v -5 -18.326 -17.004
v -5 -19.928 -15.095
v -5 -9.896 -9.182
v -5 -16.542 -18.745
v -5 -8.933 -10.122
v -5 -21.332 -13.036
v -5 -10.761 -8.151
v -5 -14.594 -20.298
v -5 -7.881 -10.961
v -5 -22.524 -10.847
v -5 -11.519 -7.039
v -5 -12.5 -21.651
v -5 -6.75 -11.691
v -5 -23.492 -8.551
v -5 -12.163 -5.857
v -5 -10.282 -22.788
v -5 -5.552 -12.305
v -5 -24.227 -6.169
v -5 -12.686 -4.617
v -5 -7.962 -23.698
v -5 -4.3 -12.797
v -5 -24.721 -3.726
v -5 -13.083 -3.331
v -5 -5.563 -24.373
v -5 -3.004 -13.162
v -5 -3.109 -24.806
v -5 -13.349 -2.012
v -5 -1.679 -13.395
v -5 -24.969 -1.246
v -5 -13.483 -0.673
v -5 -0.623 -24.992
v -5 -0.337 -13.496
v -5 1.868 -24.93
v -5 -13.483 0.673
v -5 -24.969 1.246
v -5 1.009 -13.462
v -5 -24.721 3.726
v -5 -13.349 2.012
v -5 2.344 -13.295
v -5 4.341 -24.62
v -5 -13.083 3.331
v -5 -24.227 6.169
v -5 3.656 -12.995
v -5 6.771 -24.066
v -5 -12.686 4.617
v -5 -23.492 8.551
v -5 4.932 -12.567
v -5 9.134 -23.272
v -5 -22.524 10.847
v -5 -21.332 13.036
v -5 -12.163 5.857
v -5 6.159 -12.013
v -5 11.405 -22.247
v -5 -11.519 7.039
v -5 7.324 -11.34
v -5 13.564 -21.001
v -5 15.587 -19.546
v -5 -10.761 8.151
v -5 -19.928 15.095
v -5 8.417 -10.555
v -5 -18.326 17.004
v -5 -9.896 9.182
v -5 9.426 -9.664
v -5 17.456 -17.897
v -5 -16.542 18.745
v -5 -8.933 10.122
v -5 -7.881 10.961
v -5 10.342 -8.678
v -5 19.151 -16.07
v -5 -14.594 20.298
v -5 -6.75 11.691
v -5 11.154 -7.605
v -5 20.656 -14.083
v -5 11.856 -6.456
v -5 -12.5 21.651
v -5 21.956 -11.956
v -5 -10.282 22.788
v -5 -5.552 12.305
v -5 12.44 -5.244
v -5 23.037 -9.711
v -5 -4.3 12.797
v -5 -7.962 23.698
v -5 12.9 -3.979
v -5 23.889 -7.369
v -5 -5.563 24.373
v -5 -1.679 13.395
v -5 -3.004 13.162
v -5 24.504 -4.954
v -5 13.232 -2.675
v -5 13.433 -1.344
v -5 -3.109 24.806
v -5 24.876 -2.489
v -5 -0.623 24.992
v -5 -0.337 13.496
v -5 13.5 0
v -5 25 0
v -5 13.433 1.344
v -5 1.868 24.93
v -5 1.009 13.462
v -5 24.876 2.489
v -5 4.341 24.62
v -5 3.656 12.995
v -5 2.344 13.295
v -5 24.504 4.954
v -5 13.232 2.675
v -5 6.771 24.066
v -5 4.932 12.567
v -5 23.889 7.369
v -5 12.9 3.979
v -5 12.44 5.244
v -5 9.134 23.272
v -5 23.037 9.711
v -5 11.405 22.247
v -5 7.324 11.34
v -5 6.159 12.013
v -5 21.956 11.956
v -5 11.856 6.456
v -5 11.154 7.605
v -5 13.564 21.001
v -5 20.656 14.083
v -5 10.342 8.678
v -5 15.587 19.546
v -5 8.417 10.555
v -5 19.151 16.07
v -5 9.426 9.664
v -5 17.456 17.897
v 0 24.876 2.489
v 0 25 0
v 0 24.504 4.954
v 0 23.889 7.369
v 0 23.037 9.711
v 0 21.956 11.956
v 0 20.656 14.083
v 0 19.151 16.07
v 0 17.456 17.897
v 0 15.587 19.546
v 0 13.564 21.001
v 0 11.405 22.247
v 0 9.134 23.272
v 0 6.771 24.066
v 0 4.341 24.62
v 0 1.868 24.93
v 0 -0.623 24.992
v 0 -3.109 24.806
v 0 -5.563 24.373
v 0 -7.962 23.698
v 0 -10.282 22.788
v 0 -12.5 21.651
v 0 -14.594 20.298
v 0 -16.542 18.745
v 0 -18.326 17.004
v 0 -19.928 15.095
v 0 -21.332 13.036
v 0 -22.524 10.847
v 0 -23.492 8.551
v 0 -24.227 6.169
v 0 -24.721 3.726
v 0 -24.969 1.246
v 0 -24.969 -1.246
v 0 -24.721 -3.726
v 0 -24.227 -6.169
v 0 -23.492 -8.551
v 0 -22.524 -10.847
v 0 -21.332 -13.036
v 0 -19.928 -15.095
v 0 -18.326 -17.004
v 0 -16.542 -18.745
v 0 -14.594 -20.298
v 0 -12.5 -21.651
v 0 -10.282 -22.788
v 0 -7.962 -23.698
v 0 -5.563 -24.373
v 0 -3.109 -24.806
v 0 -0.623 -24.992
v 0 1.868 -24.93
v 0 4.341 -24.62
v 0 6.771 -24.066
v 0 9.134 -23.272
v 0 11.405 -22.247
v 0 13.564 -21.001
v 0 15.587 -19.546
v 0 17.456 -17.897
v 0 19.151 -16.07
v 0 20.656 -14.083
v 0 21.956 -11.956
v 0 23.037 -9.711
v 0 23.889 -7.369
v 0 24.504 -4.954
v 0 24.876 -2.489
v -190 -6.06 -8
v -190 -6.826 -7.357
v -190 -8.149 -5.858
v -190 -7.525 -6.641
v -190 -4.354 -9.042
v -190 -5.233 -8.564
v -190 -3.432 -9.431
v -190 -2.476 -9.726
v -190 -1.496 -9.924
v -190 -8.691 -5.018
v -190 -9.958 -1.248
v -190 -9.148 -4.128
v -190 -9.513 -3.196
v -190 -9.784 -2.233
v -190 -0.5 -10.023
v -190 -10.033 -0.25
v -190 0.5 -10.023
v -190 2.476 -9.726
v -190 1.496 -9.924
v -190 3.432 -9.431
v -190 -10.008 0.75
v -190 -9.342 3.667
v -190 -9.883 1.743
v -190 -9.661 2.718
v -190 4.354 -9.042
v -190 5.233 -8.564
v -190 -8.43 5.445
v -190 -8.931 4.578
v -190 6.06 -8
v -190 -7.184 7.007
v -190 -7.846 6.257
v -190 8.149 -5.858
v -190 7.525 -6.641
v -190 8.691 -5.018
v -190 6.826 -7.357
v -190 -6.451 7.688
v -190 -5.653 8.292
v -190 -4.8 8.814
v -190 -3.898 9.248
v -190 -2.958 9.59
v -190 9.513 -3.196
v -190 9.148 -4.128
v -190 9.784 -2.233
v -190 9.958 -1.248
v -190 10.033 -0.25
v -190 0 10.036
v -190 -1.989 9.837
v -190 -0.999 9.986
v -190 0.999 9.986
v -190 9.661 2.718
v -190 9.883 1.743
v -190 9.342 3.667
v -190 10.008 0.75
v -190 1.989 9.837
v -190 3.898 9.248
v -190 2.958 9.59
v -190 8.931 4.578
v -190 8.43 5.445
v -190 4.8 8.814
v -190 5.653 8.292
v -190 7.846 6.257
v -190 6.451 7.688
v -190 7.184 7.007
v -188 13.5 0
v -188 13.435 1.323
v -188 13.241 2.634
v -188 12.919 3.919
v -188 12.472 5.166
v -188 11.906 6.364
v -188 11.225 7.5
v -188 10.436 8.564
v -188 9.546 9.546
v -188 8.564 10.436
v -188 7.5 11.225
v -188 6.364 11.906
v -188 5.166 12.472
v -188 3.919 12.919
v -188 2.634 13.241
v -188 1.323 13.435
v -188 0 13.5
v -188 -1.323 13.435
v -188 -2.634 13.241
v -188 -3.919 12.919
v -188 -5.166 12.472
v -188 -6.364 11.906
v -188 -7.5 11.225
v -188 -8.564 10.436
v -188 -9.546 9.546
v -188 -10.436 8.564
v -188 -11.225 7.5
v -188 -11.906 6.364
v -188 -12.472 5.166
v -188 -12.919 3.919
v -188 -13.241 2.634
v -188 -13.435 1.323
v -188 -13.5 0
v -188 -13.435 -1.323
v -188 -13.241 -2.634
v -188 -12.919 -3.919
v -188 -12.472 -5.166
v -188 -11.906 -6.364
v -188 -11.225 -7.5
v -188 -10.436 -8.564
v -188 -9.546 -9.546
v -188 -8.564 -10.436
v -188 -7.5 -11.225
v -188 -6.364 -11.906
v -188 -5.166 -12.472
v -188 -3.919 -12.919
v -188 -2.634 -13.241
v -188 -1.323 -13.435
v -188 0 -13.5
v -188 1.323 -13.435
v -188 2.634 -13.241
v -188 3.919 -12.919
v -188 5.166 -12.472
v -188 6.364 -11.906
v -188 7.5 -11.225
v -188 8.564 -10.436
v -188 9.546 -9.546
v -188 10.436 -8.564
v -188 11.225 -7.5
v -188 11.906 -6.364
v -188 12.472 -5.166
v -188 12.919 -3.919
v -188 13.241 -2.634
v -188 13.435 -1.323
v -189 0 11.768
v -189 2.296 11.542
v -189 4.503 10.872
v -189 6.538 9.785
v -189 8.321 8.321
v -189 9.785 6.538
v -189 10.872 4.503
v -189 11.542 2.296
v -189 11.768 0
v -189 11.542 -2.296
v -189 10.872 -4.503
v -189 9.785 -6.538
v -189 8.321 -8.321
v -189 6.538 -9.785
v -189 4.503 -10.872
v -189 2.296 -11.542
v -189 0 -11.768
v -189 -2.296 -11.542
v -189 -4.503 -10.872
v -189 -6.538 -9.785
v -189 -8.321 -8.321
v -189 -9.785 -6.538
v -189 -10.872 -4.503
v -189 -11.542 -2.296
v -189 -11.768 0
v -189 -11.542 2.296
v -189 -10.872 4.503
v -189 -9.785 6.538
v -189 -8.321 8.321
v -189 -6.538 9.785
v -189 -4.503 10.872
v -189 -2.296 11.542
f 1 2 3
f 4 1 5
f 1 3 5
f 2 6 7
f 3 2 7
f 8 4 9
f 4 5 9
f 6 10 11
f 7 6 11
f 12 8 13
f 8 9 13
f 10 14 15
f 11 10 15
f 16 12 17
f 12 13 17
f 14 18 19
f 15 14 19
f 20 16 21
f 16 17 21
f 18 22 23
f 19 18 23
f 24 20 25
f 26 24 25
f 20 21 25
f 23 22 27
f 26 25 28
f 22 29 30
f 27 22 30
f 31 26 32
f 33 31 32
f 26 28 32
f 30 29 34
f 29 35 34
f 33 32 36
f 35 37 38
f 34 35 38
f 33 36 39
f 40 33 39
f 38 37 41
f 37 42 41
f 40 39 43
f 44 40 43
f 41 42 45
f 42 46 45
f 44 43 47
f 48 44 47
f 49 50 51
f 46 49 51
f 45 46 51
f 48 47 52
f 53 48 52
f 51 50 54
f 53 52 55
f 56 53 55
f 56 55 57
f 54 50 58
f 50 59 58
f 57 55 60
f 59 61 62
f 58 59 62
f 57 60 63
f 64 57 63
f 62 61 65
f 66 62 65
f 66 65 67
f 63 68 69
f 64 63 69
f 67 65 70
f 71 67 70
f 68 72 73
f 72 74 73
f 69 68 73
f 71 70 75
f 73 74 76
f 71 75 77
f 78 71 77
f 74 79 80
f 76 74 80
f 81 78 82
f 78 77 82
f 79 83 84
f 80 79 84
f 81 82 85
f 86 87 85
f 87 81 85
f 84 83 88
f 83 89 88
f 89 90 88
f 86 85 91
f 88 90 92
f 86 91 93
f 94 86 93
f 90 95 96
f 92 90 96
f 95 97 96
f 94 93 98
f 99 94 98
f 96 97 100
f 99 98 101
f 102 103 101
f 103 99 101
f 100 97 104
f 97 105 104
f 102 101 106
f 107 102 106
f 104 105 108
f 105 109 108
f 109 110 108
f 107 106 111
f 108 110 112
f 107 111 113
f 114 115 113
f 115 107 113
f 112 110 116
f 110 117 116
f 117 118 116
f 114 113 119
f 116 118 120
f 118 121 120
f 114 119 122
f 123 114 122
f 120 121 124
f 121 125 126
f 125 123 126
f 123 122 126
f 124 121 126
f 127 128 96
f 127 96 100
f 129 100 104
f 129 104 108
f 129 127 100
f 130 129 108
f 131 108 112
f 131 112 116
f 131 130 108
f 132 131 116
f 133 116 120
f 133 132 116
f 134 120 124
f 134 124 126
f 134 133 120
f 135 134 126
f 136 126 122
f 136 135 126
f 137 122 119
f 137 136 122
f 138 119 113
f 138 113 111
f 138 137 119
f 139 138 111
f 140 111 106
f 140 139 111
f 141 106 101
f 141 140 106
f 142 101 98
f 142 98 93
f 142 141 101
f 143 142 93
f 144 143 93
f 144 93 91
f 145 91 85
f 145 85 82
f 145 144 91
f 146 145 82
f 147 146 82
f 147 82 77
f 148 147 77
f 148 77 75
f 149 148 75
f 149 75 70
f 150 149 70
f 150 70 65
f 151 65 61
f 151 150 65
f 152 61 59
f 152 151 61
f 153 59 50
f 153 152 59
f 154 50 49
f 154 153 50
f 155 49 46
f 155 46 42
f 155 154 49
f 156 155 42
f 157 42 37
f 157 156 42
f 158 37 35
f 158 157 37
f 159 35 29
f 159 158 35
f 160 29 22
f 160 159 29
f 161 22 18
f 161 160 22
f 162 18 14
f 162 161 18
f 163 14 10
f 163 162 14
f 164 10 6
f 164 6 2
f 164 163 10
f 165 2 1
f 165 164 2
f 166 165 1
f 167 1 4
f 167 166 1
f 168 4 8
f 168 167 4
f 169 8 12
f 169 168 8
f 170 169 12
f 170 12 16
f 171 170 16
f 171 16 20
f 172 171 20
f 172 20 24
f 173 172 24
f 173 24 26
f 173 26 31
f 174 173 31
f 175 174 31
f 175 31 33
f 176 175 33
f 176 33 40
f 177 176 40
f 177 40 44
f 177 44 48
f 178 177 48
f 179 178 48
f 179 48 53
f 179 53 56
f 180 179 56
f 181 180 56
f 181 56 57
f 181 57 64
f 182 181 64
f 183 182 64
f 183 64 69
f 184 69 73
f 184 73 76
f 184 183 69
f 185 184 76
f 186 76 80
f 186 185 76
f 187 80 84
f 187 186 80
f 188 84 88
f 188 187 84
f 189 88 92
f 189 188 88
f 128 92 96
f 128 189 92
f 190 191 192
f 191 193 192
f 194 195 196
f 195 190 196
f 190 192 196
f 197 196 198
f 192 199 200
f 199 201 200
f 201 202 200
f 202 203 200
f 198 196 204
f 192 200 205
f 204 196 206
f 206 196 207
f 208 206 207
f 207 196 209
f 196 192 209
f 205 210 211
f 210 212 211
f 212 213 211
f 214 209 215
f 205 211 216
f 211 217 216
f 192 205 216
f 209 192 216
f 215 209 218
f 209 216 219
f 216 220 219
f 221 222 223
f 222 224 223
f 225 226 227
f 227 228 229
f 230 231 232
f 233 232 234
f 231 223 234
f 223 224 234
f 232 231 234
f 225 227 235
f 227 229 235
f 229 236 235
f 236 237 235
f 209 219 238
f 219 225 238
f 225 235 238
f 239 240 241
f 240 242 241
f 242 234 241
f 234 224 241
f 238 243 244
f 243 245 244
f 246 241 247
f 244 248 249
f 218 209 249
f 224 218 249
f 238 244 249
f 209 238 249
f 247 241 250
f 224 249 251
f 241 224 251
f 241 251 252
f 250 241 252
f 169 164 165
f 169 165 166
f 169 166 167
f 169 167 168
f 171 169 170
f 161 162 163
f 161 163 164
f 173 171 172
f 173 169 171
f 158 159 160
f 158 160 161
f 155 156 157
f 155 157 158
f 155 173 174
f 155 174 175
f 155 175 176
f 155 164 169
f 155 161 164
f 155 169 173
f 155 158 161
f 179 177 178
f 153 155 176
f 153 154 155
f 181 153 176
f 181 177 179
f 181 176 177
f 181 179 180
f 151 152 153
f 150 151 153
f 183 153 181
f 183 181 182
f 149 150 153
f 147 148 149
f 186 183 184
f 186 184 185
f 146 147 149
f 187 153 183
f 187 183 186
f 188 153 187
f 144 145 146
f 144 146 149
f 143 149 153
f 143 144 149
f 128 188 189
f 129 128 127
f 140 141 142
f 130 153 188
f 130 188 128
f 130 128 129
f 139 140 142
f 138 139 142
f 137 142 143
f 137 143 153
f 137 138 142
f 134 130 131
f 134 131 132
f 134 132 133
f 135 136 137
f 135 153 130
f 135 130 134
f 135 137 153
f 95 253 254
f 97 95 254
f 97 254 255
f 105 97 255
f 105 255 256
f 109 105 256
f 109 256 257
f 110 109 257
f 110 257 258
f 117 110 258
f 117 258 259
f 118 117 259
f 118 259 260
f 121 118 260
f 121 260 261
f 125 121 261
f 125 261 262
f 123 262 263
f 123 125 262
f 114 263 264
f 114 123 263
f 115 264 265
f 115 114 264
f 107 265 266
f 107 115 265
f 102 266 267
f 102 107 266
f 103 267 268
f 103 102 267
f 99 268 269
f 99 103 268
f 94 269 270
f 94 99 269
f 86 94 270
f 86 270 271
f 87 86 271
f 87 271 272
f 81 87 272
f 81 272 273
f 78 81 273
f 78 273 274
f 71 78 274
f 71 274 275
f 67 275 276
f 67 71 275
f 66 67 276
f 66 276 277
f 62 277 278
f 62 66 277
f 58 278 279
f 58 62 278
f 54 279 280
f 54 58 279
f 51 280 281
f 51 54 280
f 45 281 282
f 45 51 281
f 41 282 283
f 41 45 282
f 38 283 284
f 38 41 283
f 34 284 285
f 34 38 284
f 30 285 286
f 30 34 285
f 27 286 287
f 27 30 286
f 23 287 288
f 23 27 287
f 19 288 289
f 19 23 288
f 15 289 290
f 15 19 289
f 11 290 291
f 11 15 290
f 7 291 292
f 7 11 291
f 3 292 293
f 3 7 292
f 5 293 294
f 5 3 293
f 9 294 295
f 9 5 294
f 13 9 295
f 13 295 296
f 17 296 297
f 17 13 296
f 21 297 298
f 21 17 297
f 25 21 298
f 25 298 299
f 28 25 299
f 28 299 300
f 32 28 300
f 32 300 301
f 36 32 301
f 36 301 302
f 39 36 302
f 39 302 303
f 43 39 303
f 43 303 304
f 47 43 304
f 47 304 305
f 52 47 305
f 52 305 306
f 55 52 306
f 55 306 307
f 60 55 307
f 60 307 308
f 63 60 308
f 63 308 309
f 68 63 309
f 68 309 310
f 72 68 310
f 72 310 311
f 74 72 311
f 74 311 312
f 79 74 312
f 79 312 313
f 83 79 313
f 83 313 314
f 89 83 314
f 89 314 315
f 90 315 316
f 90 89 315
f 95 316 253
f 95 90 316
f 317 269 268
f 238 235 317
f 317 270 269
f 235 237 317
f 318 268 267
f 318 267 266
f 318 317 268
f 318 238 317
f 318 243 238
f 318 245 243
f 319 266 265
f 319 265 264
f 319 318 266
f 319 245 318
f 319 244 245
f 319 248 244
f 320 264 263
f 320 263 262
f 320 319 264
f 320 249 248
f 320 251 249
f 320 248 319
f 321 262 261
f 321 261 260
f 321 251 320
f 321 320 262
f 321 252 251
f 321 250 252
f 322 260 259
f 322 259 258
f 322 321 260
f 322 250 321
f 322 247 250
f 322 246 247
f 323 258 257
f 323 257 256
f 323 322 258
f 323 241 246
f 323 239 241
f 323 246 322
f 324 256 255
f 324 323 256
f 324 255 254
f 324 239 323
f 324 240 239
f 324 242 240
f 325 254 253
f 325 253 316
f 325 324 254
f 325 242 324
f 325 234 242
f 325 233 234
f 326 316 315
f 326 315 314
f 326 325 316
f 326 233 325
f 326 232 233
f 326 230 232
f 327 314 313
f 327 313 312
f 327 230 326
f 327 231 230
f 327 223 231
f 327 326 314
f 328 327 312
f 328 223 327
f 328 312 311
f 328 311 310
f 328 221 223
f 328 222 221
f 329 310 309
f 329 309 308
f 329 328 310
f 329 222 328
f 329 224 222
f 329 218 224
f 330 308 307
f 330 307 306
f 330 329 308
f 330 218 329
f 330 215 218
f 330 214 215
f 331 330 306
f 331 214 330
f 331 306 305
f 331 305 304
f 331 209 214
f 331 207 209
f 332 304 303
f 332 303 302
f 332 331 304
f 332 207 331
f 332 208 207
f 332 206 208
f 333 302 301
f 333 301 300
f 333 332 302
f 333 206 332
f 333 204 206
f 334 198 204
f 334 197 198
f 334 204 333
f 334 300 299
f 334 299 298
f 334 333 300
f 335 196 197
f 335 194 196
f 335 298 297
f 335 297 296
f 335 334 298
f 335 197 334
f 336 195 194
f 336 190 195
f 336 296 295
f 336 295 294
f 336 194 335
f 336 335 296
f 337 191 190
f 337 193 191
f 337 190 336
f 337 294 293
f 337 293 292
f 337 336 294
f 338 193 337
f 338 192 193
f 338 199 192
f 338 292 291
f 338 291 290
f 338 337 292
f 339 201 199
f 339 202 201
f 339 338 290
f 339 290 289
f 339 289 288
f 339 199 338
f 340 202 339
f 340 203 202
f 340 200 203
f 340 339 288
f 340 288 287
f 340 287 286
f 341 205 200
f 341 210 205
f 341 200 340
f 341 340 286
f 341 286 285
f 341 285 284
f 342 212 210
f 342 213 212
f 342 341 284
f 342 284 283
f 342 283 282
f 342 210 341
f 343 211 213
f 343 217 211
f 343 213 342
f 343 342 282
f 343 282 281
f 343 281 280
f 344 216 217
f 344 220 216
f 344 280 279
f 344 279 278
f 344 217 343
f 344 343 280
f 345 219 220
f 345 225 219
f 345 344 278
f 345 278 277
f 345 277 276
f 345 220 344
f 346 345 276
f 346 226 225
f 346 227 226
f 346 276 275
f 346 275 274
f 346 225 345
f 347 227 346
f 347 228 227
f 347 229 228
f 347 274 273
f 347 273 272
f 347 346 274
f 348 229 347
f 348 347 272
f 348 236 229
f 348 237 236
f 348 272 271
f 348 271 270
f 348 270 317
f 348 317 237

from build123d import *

# Parameters (mm, degrees)
F0_R     = 13.5
F1_DEPTH = 190
F0_R_2   = 25
F2_DEPTH = 5


with BuildPart() as f1:
    # F0 (on Right) → F1 (new body)
    with BuildSketch(Plane.YZ):
        Circle(F0_R)
    extrude(amount=-F1_DEPTH)

    # F0 (on Right) → F2 (join)
    with BuildSketch(Plane.YZ):
        Circle(F0_R_2)
        Circle(F0_R, mode=Mode.SUBTRACT)
    extrude(amount=-F2_DEPTH)

    # F4 (on face) → F5 (revolve, cut)
    with BuildSketch(Plane(origin=(0, 0, 0), x_dir=(-1, 0, 0), z_dir=(0, 1, 0))):
        Polygon((190, 13.5), (188, 13.5), (190, 10.035898), align=None)
    revolve(axis=Axis((-95, 0, 0), (-1, 0, 0)), mode=Mode.SUBTRACT)


solid = f1.part
